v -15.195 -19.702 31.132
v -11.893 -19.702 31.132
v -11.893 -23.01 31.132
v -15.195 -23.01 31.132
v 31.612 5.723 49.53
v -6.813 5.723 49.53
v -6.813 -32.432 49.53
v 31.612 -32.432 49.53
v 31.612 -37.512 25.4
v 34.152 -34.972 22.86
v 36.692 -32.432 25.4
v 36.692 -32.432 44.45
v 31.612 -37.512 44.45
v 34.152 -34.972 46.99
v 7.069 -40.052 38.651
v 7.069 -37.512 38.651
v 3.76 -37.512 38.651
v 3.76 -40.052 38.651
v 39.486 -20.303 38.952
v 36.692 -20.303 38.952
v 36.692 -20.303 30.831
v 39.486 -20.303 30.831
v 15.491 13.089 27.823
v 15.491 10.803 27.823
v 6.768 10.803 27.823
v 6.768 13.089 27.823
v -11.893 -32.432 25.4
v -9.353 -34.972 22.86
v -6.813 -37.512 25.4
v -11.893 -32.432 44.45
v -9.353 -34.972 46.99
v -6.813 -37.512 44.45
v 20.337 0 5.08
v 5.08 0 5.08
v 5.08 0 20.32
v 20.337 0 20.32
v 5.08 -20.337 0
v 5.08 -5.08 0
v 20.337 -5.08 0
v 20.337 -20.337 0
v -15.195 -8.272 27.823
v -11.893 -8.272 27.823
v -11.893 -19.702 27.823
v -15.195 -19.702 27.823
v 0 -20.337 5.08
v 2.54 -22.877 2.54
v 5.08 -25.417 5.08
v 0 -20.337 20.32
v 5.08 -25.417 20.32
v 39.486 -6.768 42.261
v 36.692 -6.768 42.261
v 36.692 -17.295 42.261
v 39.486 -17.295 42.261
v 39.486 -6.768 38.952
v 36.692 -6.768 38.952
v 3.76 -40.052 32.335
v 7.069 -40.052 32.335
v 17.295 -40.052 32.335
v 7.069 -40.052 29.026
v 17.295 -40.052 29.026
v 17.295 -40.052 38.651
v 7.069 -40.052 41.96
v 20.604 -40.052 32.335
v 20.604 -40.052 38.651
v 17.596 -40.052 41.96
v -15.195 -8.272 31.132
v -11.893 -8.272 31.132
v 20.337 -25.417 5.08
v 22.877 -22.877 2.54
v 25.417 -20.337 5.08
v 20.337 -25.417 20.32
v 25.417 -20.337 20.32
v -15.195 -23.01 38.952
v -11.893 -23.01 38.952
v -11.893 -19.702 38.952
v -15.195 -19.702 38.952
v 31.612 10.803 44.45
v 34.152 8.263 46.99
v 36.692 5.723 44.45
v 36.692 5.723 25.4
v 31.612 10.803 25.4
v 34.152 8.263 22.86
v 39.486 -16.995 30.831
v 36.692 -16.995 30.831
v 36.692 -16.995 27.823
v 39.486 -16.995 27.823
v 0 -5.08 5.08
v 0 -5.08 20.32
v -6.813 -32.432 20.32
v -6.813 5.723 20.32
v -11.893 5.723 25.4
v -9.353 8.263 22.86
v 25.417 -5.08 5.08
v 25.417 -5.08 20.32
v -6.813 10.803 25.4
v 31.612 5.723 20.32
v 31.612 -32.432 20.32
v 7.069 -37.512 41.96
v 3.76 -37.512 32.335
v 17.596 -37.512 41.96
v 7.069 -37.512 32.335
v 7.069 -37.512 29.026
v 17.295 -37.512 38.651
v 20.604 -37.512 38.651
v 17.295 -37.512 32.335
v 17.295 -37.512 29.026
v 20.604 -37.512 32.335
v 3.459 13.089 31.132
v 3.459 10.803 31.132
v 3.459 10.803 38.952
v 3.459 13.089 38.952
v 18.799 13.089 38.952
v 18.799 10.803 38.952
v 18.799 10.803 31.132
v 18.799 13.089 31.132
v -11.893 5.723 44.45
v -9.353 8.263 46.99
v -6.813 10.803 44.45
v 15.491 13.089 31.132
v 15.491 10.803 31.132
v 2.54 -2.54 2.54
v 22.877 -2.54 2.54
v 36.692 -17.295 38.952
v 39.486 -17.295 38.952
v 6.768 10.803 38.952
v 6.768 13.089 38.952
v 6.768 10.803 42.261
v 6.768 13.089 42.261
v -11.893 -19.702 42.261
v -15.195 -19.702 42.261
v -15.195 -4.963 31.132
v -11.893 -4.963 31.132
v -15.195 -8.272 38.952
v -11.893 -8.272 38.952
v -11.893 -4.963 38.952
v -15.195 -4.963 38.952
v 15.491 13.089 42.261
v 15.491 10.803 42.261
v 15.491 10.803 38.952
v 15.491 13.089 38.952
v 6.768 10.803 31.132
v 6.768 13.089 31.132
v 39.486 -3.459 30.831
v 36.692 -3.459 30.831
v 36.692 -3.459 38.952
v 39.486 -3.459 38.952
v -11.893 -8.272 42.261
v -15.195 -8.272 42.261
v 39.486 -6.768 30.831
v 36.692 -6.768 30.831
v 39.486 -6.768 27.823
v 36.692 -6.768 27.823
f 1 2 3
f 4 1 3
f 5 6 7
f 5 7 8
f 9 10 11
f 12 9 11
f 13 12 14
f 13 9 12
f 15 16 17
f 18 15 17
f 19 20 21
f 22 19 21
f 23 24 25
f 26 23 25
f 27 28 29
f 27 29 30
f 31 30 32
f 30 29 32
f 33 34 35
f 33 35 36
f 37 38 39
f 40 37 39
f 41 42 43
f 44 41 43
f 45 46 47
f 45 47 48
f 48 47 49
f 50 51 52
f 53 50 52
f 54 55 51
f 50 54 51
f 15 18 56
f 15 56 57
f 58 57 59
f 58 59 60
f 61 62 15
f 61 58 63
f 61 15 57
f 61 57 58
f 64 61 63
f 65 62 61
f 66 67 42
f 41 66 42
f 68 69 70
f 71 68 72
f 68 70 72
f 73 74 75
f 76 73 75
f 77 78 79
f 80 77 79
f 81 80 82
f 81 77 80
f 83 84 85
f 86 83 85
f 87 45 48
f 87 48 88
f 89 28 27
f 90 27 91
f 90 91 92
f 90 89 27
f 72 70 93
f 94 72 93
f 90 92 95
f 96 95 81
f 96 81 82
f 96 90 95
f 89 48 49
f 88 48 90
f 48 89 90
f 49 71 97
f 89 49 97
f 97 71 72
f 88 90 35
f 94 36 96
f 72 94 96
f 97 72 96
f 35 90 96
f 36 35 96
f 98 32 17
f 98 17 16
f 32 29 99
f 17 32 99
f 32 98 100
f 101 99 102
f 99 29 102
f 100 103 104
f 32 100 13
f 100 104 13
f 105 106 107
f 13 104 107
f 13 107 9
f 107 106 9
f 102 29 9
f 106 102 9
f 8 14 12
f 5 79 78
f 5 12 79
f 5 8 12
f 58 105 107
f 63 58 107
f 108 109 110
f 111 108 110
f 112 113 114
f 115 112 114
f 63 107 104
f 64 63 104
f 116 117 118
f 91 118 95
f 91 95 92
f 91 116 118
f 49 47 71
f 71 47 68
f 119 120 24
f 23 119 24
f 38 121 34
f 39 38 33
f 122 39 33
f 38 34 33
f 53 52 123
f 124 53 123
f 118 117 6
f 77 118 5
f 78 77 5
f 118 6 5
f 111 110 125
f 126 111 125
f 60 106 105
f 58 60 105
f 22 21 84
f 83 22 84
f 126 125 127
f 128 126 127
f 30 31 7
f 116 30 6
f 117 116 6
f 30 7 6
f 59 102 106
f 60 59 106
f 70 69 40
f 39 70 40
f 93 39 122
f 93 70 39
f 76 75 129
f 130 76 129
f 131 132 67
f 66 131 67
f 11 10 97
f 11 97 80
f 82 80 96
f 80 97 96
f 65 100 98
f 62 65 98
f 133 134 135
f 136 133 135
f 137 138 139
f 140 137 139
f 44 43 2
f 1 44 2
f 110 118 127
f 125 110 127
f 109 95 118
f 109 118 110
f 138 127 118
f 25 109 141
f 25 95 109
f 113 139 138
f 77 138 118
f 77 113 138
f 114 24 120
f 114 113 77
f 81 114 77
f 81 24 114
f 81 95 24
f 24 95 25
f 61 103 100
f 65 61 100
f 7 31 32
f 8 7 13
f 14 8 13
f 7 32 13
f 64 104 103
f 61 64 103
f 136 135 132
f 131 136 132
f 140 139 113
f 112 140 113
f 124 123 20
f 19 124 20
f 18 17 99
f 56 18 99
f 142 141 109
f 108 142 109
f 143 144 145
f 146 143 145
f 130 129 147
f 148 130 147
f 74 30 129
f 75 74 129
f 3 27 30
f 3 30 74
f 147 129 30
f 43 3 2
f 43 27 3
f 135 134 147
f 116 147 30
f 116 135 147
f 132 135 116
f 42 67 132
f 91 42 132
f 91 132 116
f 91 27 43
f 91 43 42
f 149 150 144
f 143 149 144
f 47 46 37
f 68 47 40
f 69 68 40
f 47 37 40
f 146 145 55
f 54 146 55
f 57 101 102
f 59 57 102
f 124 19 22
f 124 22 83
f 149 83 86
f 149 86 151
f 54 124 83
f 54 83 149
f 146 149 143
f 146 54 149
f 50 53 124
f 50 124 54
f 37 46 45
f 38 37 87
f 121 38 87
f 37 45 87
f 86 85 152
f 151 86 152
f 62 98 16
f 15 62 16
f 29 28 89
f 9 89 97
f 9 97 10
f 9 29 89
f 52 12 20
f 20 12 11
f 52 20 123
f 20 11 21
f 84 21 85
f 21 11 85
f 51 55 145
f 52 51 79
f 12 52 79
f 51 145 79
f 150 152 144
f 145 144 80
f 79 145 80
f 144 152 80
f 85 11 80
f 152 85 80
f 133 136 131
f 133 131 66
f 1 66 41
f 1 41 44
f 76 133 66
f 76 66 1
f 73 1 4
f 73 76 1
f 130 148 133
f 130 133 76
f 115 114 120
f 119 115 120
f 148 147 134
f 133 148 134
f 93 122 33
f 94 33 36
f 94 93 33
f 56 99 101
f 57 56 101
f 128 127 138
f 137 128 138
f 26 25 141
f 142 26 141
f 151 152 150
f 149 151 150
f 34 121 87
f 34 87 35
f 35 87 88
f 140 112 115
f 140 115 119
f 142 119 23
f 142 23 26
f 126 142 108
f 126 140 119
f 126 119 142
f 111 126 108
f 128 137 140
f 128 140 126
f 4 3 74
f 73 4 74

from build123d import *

# Parameters (mm, degrees)
F0_W      = 25.41670762
F0_H      = 25.4167113453
F1_DEPTH  = 26.416
F2_SIZE   = 5.08
F3_SIZE   = 5.08
F4_SIZE   = 5.08
F5_SIZE   = 5.08
F6_SIZE   = 5.08
F7_SIZE   = 5.08
F8_SIZE   = 5.08
F9_SIZE   = 5.08
F10_SIZE  = 5.08
F11_SIZE  = 5.08
F12_SIZE  = 5.08
F13_SIZE  = 5.08
F14_W     = 48.5844528303
F14_H     = 48.3157048002
F15_DEPTH = 6.096
F16_DEPTH = 23.114
F17_SIZE  = 5.08
F18_SIZE  = 5.08
F19_SIZE  = 5.08
F20_SIZE  = 5.08
F21_SIZE  = 5.08
F22_SIZE  = 5.08
F23_SIZE  = 5.08
F24_SIZE  = 5.08
F25_SIZE  = 5.08
F26_SIZE  = 5.08
F27_SIZE  = 5.08
F29_DEPTH = 2.54
F31_DEPTH = 2.286
F33_DEPTH = 2.794
F35_DEPTH = 3.302


with BuildPart() as f1:
    # F0 (on Top) → F1 (new body)
    with BuildSketch(Plane.XY):
        with Locations((12.70835381, -12.7083556727)):
            Rectangle(F0_W, F0_H)
    extrude(amount=F1_DEPTH)

    # F2
    f2_edges = [f1.edges().sort_by_distance(p)[0] for p in [
        (12.708354, -25.416711, 0),
    ]]
    chamfer(f2_edges, length=F2_SIZE)

    # F3
    f3_edges = [f1.edges().sort_by_distance(p)[0] for p in [
        (12.708354, 0, 0),
    ]]
    chamfer(f3_edges, length=F3_SIZE)

    # F4
    f4_edges = [f1.edges().sort_by_distance(p)[0] for p in [
        (12.708354, 0, 26.416),
    ]]
    chamfer(f4_edges, length=F4_SIZE)

    # F5
    f5_edges = [f1.edges().sort_by_distance(p)[0] for p in [
        (12.708354, -25.416711, 26.416),
    ]]
    chamfer(f5_edges, length=F5_SIZE)

    # F6
    f6_edges = [f1.edges().sort_by_distance(p)[0] for p in [
        (25.416708, 0, 13.208),
    ]]
    chamfer(f6_edges, length=F6_SIZE)

    # F7
    f7_edges = [f1.edges().sort_by_distance(p)[0] for p in [
        (0, 0, 13.208),
    ]]
    chamfer(f7_edges, length=F7_SIZE)

    # F8
    f8_edges = [f1.edges().sort_by_distance(p)[0] for p in [
        (0, -25.416711, 13.208),
    ]]
    chamfer(f8_edges, length=F8_SIZE)

    # F9
    f9_edges = [f1.edges().sort_by_distance(p)[0] for p in [
        (25.416708, -25.416711, 13.208),
    ]]
    chamfer(f9_edges, length=F9_SIZE)

    # F10
    f10_edges = [f1.edges().sort_by_distance(p)[0] for p in [
        (25.416708, -12.708356, 0),
    ]]
    chamfer(f10_edges, length=F10_SIZE)

    # F11
    f11_edges = [f1.edges().sort_by_distance(p)[0] for p in [
        (25.416708, -12.708356, 26.416),
    ]]
    chamfer(f11_edges, length=F11_SIZE)

    # F12
    f12_edges = [f1.edges().sort_by_distance(p)[0] for p in [
        (0, -12.708356, 0),
    ]]
    chamfer(f12_edges, length=F12_SIZE)

    # F13
    f13_edges = [f1.edges().sort_by_distance(p)[0] for p in [
        (0, -12.708356, 26.416),
    ]]
    chamfer(f13_edges, length=F13_SIZE)

    # F14 (on face) → F15 (join)
    with BuildSketch(Plane.XY.offset(26.416)):
        with Locations((12.3993125744, -13.3544201963)):
            Rectangle(F14_W, F14_H)
    extrude(amount=-F15_DEPTH)

    # F16 (add): a face of the model
    f16_faces = [f1.faces().sort_by_distance(p)[0] for p in [
        (12.3993125744, -13.3544201963, 26.416),
    ]]
    extrude(f16_faces, amount=F16_DEPTH)

    # F17
    f17_edges = [f1.edges().sort_by_distance(p)[0] for p in [
        (-11.892914, -37.512273, 34.925),
    ]]
    chamfer(f17_edges, length=F17_SIZE)

    # F18
    f18_edges = [f1.edges().sort_by_distance(p)[0] for p in [
        (14.939313, -37.512273, 49.53),
        (14.939313, -37.512273, 20.32),
    ]]
    chamfer(f18_edges, length=F18_SIZE)

    # F19
    f19_edges = [f1.edges().sort_by_distance(p)[0] for p in [
        (36.691539, -37.512273, 34.925),
    ]]
    chamfer(f19_edges, length=F19_SIZE)

    # F20
    f20_edges = [f1.edges().sort_by_distance(p)[0] for p in [
        (36.691539, -10.81442, 49.53),
    ]]
    chamfer(f20_edges, length=F20_SIZE)

    # F21
    f21_edges = [f1.edges().sort_by_distance(p)[0] for p in [
        (36.691539, -10.81442, 20.32),
    ]]
    chamfer(f21_edges, length=F21_SIZE)

    # F22
    f22_edges = [f1.edges().sort_by_distance(p)[0] for p in [
        (36.691539, 10.803432, 34.925),
    ]]
    chamfer(f22_edges, length=F22_SIZE)

    # F23
    f23_edges = [f1.edges().sort_by_distance(p)[0] for p in [
        (9.859313, 10.803432, 49.53),
    ]]
    chamfer(f23_edges, length=F23_SIZE)

    # F24
    f24_edges = [f1.edges().sort_by_distance(p)[0] for p in [
        (9.859313, 10.803432, 20.32),
    ]]
    chamfer(f24_edges, length=F24_SIZE)

    # F25
    f25_edges = [f1.edges().sort_by_distance(p)[0] for p in [
        (-11.892914, 10.803432, 34.925),
    ]]
    chamfer(f25_edges, length=F25_SIZE)

    # F26
    f26_edges = [f1.edges().sort_by_distance(p)[0] for p in [
        (-11.892914, -13.35442, 49.53),
    ]]
    chamfer(f26_edges, length=F26_SIZE)

    # F27
    f27_edges = [f1.edges().sort_by_distance(p)[0] for p in [
        (-11.892914, -13.35442, 20.32),
    ]]
    chamfer(f27_edges, length=F27_SIZE)

    # F28 (on face) → F29 (join)
    with BuildSketch(Plane.XZ.offset(37.5122725964)):
        Polygon((17.5961852074, 41.9601351023), (7.0685530081, 41.9601351023), (7.0685530081, 38.6514477432), (3.7598696072, 38.6514477432), (3.7598696072, 32.3348678648), (7.0685530081, 32.3348678648), (7.0685530081, 29.026184231), (17.2953959554, 29.026184231), (17.2953959554, 32.3348678648), (20.6040795892, 32.3348678648), (20.6040795892, 38.6514477432), (17.2953959554, 38.6514477432), align=None)
    extrude(amount=F29_DEPTH)

    # F30 (on face) → F31 (join)
    with BuildSketch(Plane(origin=(0, 10.8034322038, 0), x_dir=(-1, 0, 0), z_dir=(0, 1, 0))):
        Polygon((-6.7677642219, 38.9522351325), (-6.7677642219, 42.2609224916), (-15.4906576499, 42.2609224916), (-15.4906576499, 38.9522351325), (-18.7993440777, 38.9522351325), (-18.7993440777, 31.1317108572), (-15.4906576499, 31.1317108572), (-15.4906576499, 27.8230272233), (-6.7677642219, 27.8230272233), (-6.7677642219, 31.1317108572), (-3.4590810537, 31.1317108572), (-3.4590810537, 38.9522351325), align=None)
    extrude(amount=F31_DEPTH)

    # F32 (on face) → F33 (join)
    with BuildSketch(Plane.YZ.offset(36.6915389895)):
        Polygon((-6.7677642219, 38.9522351325), (-6.7677642219, 42.2609224916), (-17.2953940928, 42.2609224916), (-17.2953940928, 38.9522351325), (-20.3032903373, 38.9522351325), (-20.3032903373, 30.8309197426), (-16.9946048409, 30.8309197426), (-16.9946048409, 27.8230272233), (-6.7677642219, 27.8230272233), (-6.7677642219, 30.8309197426), (-3.4590810537, 30.8309197426), (-3.4590810537, 38.9522351325), align=None)
    extrude(amount=F33_DEPTH)

    # F34 (on face) → F35 (join)
    with BuildSketch(Plane(origin=(-11.8929138407, 0, 0), x_dir=(0, -1, 0), z_dir=(-1, 0, 0))):
        Polygon((19.7017118335, 42.2609224916), (8.2717109472, 42.2609224916), (8.2717109472, 38.9522351325), (4.9630273134, 38.9522351325), (4.9630273134, 31.1317108572), (8.2717109472, 31.1317108572), (8.2717109472, 27.8230272233), (19.7017118335, 27.8230272233), (19.7017118335, 31.1317108572), (23.0103954673, 31.1317108572), (23.0103954673, 38.9522351325), (19.7017118335, 38.9522351325), align=None)
    extrude(amount=F35_DEPTH)


solid = f1.part
